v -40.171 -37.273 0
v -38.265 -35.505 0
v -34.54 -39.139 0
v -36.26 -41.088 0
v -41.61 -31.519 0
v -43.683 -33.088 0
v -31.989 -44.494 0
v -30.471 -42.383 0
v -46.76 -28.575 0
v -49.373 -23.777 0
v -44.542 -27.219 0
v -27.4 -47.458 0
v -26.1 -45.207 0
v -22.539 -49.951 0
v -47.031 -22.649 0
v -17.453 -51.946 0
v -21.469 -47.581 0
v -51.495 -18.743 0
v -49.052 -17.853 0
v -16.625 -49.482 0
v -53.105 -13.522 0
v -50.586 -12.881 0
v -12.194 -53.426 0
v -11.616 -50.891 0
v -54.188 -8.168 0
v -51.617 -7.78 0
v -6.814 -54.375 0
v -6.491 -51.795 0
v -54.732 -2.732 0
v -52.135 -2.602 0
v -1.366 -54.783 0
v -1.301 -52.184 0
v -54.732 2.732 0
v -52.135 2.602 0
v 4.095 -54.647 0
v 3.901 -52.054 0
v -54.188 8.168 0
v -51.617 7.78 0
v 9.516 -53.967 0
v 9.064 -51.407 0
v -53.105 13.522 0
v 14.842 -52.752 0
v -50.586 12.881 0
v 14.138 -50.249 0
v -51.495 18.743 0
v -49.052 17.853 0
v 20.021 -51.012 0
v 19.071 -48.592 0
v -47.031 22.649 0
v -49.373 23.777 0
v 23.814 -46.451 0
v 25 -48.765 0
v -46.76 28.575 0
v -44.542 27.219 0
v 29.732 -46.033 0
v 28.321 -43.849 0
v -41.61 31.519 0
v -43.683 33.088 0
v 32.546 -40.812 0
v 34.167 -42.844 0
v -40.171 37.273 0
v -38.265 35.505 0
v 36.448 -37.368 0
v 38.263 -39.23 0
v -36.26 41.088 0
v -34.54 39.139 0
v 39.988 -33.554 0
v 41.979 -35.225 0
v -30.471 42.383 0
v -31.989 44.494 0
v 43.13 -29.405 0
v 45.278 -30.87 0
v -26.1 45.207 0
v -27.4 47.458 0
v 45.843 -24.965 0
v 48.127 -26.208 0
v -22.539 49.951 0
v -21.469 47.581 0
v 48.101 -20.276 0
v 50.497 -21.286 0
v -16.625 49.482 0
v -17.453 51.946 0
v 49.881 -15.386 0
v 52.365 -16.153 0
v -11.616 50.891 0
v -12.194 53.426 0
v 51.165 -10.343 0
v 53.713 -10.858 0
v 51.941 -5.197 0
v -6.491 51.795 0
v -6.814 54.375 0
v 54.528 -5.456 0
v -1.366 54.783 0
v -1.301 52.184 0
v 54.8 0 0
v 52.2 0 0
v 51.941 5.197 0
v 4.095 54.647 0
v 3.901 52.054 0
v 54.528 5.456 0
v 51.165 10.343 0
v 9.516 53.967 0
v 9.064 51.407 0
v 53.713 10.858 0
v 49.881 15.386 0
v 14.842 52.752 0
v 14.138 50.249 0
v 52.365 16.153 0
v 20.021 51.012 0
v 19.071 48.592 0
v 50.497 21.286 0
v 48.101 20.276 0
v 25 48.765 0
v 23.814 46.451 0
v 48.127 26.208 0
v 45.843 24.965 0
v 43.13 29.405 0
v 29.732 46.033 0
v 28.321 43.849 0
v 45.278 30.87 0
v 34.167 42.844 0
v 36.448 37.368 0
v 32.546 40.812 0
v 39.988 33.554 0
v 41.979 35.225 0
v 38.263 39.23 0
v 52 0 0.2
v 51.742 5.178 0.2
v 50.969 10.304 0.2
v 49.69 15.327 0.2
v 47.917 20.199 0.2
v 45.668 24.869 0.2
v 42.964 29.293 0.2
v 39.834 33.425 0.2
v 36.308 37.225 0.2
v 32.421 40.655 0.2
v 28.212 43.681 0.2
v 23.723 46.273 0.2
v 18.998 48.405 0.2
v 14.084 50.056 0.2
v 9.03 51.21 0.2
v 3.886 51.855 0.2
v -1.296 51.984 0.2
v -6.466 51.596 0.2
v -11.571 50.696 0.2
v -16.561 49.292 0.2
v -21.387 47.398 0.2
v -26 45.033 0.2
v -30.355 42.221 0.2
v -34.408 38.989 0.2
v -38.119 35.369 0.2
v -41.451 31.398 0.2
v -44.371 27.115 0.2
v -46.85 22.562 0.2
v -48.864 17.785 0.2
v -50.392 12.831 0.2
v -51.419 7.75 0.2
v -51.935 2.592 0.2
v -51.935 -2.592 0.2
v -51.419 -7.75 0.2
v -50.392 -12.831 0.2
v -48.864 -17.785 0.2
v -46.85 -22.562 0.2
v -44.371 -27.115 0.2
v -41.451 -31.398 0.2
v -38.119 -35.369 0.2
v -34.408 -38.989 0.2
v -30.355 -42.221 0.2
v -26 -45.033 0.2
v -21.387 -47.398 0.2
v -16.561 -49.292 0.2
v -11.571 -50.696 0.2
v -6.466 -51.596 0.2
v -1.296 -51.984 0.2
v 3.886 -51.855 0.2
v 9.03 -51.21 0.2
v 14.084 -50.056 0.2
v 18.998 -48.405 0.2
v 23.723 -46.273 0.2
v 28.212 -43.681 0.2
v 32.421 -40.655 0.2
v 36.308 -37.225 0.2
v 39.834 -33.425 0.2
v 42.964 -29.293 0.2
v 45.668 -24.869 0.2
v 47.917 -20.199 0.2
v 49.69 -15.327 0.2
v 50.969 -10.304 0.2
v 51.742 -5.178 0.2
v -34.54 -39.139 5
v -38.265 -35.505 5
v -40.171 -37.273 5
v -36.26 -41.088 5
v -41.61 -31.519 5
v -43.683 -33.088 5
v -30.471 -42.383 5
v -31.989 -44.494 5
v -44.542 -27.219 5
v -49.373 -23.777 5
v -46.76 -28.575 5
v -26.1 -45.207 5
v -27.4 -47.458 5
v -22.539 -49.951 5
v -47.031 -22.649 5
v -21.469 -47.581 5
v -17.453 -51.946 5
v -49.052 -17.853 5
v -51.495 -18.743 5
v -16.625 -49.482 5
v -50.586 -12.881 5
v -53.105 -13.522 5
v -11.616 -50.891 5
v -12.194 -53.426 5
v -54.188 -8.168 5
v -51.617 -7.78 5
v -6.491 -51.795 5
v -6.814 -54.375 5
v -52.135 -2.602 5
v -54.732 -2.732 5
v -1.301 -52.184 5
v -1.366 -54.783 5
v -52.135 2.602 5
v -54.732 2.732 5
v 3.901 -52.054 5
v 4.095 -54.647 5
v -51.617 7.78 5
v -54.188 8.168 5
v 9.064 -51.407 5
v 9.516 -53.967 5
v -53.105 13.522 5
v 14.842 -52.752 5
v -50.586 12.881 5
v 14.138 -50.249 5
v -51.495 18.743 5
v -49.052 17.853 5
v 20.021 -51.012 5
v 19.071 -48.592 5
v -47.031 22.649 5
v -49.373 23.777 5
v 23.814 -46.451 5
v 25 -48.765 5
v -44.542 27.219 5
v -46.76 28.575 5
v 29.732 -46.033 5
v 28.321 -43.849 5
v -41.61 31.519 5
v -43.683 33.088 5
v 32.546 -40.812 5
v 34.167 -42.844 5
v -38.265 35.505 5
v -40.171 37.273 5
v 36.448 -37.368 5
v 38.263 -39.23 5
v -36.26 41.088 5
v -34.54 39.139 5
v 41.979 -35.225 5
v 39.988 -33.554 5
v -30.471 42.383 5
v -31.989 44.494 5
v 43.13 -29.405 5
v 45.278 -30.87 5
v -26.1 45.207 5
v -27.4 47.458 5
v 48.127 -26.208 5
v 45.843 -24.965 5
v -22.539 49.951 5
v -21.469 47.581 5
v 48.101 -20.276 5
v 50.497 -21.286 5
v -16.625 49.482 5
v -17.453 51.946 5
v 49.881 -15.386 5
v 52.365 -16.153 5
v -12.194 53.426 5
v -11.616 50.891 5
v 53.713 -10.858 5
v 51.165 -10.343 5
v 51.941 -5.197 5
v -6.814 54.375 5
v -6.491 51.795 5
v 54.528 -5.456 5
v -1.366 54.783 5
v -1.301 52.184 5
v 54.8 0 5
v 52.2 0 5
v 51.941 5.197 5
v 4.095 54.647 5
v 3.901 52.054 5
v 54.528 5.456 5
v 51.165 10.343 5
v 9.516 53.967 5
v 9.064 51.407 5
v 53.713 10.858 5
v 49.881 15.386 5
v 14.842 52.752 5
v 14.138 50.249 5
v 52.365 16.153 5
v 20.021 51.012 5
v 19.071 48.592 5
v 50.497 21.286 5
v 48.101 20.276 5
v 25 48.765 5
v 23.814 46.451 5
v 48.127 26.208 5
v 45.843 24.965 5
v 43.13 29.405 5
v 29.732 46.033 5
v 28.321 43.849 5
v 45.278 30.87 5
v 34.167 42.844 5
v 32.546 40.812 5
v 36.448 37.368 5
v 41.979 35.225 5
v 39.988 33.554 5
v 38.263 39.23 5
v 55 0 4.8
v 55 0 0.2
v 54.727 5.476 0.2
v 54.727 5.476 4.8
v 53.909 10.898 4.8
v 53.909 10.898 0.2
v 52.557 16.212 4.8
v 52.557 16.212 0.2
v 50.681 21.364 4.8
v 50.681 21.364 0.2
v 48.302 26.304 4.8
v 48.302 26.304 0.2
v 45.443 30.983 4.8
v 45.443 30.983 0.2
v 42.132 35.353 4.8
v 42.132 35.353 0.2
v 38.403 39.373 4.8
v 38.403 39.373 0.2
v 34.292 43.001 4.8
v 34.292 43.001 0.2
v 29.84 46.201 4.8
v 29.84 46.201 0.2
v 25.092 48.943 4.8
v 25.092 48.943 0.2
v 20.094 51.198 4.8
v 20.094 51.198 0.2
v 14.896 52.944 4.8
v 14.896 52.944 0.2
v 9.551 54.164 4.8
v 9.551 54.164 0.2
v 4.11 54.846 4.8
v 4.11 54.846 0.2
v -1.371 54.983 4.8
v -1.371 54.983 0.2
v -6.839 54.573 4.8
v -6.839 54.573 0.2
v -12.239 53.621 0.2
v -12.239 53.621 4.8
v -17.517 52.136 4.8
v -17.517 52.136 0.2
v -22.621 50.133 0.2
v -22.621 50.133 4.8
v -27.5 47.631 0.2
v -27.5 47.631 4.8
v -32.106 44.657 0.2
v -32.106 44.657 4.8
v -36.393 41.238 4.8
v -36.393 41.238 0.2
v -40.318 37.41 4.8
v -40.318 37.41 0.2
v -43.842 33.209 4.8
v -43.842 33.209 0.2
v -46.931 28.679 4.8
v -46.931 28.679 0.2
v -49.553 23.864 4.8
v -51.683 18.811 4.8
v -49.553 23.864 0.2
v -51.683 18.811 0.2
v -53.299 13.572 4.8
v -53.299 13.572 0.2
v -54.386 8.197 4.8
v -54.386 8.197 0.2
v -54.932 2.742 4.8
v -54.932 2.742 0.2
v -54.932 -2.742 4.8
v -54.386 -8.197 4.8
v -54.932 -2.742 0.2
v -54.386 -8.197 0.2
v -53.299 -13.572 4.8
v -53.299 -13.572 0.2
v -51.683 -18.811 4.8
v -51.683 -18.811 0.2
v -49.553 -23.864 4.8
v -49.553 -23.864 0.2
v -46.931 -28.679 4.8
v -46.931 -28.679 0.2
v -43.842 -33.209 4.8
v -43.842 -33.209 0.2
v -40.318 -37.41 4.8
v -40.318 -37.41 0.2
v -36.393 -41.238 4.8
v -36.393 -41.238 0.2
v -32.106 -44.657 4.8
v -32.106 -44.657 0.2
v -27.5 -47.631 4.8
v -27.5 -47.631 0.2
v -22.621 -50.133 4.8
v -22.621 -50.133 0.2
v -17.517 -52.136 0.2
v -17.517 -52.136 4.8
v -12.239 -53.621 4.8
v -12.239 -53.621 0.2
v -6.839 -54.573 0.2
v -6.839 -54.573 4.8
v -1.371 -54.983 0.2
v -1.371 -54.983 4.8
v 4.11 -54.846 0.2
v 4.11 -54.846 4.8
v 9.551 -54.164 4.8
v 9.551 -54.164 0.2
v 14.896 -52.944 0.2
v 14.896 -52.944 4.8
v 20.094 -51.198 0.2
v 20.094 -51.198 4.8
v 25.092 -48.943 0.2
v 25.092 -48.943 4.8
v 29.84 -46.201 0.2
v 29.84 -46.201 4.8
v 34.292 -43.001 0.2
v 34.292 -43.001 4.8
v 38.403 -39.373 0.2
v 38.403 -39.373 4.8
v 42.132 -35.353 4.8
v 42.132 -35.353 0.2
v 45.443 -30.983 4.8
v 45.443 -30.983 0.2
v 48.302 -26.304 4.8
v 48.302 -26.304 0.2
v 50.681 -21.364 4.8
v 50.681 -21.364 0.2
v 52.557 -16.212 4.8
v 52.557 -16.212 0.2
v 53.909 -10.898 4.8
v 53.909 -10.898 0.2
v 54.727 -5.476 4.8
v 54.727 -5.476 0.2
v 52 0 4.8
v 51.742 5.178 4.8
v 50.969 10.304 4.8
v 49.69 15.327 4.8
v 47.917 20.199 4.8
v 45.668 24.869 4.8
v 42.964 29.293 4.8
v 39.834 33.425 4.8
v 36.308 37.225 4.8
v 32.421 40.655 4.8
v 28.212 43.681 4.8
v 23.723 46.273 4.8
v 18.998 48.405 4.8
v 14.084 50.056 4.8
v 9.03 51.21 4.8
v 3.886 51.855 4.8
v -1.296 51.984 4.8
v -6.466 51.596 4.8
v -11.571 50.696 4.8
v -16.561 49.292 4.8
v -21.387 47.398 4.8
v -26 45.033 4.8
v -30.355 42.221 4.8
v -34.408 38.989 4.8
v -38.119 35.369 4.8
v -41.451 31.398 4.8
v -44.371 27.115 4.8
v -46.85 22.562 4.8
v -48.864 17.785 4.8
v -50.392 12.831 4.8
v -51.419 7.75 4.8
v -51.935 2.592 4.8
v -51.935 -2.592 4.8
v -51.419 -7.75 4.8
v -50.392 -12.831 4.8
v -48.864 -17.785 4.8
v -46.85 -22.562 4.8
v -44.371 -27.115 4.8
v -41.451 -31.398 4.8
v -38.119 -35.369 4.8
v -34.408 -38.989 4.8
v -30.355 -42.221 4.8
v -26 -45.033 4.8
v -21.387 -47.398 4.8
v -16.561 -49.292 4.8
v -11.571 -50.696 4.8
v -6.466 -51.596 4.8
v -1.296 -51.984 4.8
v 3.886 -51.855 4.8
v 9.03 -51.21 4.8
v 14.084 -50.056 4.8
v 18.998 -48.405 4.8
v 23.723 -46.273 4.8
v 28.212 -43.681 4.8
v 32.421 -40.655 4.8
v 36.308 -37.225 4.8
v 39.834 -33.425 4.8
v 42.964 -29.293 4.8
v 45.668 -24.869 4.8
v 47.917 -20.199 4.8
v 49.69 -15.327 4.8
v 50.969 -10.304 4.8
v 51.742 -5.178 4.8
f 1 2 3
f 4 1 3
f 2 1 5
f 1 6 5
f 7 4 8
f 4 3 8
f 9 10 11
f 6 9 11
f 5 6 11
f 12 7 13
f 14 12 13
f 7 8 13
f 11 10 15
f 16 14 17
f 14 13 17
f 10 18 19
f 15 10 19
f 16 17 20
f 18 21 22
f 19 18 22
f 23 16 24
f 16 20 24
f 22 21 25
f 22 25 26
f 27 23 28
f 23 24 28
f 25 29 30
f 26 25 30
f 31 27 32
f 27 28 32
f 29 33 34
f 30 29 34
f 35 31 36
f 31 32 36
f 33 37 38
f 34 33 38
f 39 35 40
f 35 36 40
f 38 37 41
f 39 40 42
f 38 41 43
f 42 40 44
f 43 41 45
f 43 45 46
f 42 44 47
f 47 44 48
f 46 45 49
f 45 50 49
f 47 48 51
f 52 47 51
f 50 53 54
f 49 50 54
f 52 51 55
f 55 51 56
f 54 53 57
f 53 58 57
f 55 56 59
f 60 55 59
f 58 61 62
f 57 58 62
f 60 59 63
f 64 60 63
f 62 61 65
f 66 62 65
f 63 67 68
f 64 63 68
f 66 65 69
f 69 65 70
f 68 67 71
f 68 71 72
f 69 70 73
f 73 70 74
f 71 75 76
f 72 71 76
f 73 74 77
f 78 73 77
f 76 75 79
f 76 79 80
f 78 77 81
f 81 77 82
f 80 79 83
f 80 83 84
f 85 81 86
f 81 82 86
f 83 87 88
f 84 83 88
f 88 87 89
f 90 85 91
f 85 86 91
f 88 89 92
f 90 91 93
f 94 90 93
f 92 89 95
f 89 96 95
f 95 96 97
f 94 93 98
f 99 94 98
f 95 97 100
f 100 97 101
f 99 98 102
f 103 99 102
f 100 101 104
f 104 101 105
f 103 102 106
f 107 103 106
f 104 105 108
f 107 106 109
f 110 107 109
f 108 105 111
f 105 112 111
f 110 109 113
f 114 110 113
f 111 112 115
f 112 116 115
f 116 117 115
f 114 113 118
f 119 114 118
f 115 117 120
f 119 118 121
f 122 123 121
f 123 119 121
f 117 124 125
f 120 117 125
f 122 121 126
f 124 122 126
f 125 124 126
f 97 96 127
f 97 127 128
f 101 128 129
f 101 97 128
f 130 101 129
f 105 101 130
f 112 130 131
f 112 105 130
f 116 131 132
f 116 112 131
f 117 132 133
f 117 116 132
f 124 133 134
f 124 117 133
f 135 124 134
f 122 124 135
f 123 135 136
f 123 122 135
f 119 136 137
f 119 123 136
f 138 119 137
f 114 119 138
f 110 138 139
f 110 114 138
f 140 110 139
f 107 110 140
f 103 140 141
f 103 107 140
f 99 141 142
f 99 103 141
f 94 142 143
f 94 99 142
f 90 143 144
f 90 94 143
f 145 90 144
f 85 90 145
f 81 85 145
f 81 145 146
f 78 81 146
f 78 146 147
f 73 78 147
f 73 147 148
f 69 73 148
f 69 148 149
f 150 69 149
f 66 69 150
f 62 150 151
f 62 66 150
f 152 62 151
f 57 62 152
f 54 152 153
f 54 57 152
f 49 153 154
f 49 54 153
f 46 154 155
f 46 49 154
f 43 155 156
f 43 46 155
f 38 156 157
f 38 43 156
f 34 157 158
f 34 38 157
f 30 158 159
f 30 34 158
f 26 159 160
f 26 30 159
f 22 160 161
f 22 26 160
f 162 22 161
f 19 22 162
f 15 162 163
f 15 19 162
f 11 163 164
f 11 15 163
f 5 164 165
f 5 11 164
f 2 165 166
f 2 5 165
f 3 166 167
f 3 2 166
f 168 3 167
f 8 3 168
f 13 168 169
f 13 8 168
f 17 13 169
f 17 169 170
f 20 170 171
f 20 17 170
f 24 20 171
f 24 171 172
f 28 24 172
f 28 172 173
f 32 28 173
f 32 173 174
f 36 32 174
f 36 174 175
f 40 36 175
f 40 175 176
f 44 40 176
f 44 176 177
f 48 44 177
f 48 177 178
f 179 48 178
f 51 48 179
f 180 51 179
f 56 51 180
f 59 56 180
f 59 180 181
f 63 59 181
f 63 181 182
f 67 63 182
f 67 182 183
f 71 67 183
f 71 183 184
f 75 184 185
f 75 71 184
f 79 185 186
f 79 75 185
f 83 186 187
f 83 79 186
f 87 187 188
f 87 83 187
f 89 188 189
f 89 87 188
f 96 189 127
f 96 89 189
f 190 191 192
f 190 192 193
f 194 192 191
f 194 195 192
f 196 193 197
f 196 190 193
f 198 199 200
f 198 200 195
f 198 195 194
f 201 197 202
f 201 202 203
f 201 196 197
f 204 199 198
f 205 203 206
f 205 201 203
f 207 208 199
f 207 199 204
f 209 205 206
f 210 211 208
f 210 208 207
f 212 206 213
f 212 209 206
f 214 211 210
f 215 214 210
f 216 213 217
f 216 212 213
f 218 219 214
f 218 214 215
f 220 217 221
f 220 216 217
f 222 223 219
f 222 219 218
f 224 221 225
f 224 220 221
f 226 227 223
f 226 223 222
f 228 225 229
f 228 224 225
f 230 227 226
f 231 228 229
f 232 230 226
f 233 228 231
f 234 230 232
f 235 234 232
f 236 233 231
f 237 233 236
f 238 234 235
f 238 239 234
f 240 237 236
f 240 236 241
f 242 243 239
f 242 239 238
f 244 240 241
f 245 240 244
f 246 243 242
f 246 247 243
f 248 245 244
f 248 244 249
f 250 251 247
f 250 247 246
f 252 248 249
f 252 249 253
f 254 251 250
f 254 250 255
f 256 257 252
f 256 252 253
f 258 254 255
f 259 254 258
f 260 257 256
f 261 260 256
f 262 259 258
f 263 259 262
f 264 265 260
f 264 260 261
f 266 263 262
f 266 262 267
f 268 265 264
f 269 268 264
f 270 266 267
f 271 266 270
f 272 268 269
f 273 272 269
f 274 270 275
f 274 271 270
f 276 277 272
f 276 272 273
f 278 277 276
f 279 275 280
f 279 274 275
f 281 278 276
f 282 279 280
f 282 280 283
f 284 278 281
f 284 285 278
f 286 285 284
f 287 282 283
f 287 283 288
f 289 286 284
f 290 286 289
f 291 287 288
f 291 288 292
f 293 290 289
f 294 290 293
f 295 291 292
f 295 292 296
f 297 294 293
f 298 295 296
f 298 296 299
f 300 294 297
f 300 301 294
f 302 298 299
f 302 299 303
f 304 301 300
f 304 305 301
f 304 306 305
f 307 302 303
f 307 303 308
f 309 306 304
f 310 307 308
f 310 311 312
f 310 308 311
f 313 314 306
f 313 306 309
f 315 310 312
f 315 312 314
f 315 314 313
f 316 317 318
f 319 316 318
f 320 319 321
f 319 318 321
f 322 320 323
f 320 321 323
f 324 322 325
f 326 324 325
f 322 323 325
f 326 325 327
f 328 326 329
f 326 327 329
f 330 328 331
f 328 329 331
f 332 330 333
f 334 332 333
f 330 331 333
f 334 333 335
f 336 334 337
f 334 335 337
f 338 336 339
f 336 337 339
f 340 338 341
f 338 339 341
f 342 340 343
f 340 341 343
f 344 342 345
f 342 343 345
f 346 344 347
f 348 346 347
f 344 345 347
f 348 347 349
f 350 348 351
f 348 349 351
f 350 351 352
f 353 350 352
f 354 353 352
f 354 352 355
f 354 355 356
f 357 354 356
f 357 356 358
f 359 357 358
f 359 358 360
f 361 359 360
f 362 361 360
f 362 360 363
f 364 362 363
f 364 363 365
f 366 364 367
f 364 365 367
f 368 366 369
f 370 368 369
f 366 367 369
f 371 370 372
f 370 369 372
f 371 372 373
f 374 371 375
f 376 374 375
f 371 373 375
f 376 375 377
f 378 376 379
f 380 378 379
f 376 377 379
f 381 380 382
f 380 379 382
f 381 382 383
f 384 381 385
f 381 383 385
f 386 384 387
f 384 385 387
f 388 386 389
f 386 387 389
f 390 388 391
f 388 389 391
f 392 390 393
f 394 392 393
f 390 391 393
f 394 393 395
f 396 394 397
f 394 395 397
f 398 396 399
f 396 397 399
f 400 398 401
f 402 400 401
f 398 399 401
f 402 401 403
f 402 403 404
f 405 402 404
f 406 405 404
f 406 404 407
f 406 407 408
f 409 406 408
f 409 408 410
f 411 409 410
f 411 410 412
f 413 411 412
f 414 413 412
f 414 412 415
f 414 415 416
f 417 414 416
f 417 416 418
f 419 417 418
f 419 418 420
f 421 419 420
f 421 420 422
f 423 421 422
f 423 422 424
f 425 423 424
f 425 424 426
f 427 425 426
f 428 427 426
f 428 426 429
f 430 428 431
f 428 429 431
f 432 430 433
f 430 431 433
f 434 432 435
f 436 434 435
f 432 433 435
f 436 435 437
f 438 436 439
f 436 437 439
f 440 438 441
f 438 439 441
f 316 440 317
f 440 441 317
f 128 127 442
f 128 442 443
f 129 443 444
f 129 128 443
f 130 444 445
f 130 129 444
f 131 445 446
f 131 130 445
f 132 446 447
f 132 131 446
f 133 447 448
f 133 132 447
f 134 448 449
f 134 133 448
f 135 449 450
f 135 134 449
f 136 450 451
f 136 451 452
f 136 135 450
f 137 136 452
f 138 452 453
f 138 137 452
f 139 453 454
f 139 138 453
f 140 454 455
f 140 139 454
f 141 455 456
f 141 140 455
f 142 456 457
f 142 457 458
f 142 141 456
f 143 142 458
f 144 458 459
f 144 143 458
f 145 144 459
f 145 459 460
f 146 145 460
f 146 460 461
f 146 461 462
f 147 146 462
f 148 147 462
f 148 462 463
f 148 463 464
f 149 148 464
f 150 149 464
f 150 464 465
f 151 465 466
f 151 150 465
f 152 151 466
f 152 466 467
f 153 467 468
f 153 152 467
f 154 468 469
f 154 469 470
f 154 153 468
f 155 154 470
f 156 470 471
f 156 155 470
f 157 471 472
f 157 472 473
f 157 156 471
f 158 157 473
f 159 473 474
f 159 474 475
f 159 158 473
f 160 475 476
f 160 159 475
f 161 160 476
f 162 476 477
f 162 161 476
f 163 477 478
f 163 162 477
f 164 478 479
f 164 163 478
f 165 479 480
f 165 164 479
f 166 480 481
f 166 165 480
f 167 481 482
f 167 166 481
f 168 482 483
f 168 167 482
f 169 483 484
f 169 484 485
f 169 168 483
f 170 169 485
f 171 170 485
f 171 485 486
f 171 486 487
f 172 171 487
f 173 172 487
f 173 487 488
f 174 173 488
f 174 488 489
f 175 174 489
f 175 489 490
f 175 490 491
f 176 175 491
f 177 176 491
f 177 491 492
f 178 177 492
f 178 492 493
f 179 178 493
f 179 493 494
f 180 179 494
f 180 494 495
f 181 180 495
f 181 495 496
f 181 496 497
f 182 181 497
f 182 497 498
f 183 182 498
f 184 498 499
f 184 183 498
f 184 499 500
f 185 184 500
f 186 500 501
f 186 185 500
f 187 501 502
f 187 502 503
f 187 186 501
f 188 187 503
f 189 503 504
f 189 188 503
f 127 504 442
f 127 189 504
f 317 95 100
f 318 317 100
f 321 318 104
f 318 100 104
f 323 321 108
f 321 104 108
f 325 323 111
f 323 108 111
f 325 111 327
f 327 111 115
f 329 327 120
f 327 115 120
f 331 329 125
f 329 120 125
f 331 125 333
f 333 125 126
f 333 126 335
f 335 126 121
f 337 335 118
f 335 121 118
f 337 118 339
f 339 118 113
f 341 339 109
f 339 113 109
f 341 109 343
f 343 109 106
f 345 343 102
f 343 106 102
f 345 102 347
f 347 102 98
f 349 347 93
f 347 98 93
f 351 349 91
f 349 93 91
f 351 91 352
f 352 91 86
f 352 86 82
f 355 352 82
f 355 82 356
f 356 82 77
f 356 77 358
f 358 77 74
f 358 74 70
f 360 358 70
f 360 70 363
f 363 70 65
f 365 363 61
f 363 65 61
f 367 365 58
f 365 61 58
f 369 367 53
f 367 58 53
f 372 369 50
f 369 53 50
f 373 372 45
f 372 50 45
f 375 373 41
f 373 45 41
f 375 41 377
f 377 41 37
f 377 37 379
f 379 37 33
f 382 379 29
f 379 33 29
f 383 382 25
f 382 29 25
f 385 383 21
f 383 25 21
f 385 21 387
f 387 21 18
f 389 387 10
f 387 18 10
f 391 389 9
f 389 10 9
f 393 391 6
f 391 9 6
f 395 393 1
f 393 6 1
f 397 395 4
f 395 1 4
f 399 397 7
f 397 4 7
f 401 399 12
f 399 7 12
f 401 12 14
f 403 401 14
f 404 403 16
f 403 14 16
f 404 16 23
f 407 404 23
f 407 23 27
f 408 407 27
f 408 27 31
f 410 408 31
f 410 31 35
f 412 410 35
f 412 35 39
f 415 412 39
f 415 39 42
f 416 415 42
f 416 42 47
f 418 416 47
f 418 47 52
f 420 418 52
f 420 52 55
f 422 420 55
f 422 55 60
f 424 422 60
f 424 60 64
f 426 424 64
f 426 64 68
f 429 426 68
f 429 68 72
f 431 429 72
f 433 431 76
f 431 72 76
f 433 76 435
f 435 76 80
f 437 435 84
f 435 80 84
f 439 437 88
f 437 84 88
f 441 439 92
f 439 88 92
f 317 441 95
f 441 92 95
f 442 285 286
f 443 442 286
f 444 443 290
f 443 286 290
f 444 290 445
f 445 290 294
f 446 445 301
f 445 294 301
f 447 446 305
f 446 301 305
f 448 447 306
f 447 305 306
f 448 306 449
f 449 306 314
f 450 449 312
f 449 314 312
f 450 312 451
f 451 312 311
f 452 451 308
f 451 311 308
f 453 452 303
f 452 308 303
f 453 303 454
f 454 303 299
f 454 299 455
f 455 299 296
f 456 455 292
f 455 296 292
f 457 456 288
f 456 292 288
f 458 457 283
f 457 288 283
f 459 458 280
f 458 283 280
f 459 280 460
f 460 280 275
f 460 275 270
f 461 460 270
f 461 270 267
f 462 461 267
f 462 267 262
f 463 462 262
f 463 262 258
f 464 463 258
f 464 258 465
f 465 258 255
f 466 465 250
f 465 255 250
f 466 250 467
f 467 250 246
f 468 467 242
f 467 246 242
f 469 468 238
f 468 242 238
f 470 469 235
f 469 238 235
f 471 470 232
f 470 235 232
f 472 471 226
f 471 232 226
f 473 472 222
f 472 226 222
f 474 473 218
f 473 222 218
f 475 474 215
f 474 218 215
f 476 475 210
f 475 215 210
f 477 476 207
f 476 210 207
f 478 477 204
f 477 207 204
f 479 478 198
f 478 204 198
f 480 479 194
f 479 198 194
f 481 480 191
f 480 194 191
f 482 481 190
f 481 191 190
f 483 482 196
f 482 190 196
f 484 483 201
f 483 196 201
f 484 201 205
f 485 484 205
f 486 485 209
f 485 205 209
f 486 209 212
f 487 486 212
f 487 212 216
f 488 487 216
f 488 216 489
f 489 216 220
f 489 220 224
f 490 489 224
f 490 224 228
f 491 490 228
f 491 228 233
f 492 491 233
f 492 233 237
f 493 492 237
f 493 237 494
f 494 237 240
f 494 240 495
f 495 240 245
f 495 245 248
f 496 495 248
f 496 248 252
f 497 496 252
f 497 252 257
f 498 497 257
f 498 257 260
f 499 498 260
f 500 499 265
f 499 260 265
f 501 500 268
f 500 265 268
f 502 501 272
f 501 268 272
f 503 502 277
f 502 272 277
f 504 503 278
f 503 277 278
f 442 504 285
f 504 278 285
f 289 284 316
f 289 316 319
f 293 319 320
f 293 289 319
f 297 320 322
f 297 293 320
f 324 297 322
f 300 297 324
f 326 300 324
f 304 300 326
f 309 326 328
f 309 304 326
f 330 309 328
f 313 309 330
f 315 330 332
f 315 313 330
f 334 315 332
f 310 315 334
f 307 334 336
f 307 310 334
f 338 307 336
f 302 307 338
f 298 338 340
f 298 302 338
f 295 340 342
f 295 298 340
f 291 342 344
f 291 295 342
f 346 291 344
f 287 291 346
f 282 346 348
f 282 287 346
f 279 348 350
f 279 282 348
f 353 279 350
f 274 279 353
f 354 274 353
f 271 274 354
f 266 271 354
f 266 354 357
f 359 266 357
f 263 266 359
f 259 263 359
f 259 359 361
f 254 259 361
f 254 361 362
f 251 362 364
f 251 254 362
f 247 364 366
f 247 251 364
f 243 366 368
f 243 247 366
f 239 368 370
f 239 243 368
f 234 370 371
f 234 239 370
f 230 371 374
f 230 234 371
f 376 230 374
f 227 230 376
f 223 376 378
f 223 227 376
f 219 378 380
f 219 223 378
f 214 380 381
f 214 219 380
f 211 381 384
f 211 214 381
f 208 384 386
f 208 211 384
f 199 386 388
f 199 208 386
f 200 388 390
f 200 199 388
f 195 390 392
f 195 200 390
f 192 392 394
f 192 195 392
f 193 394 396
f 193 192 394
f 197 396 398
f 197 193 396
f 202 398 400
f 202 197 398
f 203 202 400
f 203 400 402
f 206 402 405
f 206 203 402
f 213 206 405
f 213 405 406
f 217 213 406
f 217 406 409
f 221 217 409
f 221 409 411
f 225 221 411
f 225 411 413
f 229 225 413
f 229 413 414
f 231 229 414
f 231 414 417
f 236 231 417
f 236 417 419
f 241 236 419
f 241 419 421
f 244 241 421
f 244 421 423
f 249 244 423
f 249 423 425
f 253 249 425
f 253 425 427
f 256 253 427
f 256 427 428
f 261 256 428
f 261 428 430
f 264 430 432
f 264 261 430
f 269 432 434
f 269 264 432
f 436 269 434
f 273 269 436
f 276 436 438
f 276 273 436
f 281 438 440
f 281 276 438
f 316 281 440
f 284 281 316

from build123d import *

# Parameters (mm, degrees)
SCHIZZO1_R                   = 55
SCHIZZO1_R_2                 = 52
ESTRUSIONE_ESTRUSIONE1_DEPTH = 5
SMUSSO1_SIZE                 = 0.2


with BuildPart() as part:
    # Schizzo1 → Estrusione-Estrusione1 (new body)
    with BuildSketch(Plane.XY):
        Circle(SCHIZZO1_R)
        Circle(SCHIZZO1_R_2, mode=Mode.SUBTRACT)
    extrude(amount=ESTRUSIONE_ESTRUSIONE1_DEPTH)

    # Smusso1
    smusso1_edges = [part.edges().sort_by_distance(p)[0] for p in [
        (-55, 0, 0),
        (-55, 0, 5),
        (-52, 0, 0),
        (-52, 0, 5),
    ]]
    chamfer(smusso1_edges, length=SMUSSO1_SIZE)


solid = part.part
